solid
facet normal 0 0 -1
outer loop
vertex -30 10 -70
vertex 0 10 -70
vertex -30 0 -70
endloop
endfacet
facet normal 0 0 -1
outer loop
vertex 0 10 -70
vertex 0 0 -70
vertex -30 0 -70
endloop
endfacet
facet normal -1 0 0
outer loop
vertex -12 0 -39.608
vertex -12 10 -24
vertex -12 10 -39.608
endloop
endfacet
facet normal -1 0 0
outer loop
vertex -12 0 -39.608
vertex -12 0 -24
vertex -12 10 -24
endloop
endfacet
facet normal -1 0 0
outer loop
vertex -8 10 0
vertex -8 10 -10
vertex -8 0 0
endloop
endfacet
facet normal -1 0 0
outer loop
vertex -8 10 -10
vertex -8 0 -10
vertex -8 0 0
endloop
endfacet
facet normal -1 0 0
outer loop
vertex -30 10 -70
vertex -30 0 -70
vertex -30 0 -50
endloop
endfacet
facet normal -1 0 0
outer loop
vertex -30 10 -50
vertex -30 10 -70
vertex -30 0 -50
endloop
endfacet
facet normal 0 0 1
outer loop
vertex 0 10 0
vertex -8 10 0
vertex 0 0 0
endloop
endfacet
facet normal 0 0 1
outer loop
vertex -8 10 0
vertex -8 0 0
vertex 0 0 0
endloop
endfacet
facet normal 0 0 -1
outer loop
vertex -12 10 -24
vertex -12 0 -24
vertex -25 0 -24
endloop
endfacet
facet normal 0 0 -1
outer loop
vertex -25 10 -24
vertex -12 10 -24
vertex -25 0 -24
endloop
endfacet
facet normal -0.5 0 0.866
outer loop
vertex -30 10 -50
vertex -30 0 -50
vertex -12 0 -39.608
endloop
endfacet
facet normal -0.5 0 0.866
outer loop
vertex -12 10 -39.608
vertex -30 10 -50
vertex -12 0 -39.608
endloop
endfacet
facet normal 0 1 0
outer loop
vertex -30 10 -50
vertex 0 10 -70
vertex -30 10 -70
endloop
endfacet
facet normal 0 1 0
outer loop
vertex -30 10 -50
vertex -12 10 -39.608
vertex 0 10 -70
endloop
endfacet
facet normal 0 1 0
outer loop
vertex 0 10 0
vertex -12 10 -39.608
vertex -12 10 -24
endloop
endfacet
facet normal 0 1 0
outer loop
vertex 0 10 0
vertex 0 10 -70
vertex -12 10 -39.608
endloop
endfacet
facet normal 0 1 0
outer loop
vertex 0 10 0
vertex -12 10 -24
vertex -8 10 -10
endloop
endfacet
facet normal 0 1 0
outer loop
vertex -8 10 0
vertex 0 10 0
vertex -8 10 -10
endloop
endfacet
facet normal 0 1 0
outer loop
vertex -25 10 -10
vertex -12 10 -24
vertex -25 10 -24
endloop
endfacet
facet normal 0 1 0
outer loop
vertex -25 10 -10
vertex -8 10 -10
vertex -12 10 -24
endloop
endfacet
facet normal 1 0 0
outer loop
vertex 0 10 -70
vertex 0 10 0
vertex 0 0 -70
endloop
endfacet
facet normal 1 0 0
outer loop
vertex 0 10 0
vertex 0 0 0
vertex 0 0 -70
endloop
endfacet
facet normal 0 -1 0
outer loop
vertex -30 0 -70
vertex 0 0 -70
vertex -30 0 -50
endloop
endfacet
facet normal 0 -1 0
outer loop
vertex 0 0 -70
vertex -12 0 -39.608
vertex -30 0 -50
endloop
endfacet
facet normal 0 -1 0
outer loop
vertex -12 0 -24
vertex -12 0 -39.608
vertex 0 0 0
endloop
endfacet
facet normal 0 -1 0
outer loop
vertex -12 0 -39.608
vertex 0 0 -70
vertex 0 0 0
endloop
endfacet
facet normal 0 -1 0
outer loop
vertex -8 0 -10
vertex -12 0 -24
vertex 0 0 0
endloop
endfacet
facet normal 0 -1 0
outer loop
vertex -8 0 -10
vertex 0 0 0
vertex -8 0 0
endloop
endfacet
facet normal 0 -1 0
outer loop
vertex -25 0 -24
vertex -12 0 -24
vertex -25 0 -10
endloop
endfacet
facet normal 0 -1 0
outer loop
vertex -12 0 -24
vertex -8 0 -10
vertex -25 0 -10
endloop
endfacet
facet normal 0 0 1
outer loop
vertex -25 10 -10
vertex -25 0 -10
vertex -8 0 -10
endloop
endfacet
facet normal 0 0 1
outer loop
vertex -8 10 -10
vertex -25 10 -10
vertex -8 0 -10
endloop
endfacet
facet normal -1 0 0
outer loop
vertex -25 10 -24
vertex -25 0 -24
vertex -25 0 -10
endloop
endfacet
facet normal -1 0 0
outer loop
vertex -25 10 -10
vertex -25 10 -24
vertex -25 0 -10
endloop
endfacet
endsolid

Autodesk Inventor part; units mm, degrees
ref_plane "YZ Plane" through (0, 0, 0) normal (1, 0, 0) x (0, 1, 0)
ref_plane "XZ Plane" through (0, 0, 0) normal (0, 1, 0) x (-1, 0, 0)
ref_plane "XY Plane" through (0, 0, 0) normal (0, 0, 1) x (1, 0, 0)
sketch "Boceto1" plane through (0, 0, 0) normal (0, 1, 0) x (-1, 0, 0)
  line L0 (0, 0) -> (0, -70)
  line L1 (0, -70) -> (30, -70)
  line L2 (30, -70) -> (30, -50)
  line L3 (30, -50) -> (12, -39.6077)
  line L4 (12, -24) -> (25, -24)
  line L5 (25, -24) -> (25, -10)
  line L6 (25, -10) -> (8, -10)
  line L7 (8, 0) -> (0, 0)
  line L8 (12, -24) -> (12, -39.6077)
  line L9 (8, -10) -> (8, 0)
  dimension "d0" = 20
  dimension "d1" = 70
  dimension "d2" = 30
  dimension "d5" = 25
  dimension "d6" = 10
  dimension "d7" = 8
  dimension "d8" = 12
  dimension "d9" = 120
  dimension "d10" = 14
extrude "Extrusión1" add sketch "Boceto1" along normal blind 10
equation "\"Radio_pliegue\" = Grosor"
equation "\"Anchura_desahogo_plegado\" = Grosor"
equation "\"Profundidad_desahogo_plegado\" = 0.5 * Grosor"
equation "\"Tamaño_destalonado\" = 4 * Grosor"
equation "\"Remanente_mínimo\" = 2 * Grosor"
equation "\"Radiodetransición\" = Radio_pliegue"
equation "\"Tamaño_de_radio_de_Jacobi\" = Radio_pliegue"
equation "\"TamañoSeparación\" = Grosor"
equation "\"Grosor\" = 0.5"
properties part number "Practica3"
